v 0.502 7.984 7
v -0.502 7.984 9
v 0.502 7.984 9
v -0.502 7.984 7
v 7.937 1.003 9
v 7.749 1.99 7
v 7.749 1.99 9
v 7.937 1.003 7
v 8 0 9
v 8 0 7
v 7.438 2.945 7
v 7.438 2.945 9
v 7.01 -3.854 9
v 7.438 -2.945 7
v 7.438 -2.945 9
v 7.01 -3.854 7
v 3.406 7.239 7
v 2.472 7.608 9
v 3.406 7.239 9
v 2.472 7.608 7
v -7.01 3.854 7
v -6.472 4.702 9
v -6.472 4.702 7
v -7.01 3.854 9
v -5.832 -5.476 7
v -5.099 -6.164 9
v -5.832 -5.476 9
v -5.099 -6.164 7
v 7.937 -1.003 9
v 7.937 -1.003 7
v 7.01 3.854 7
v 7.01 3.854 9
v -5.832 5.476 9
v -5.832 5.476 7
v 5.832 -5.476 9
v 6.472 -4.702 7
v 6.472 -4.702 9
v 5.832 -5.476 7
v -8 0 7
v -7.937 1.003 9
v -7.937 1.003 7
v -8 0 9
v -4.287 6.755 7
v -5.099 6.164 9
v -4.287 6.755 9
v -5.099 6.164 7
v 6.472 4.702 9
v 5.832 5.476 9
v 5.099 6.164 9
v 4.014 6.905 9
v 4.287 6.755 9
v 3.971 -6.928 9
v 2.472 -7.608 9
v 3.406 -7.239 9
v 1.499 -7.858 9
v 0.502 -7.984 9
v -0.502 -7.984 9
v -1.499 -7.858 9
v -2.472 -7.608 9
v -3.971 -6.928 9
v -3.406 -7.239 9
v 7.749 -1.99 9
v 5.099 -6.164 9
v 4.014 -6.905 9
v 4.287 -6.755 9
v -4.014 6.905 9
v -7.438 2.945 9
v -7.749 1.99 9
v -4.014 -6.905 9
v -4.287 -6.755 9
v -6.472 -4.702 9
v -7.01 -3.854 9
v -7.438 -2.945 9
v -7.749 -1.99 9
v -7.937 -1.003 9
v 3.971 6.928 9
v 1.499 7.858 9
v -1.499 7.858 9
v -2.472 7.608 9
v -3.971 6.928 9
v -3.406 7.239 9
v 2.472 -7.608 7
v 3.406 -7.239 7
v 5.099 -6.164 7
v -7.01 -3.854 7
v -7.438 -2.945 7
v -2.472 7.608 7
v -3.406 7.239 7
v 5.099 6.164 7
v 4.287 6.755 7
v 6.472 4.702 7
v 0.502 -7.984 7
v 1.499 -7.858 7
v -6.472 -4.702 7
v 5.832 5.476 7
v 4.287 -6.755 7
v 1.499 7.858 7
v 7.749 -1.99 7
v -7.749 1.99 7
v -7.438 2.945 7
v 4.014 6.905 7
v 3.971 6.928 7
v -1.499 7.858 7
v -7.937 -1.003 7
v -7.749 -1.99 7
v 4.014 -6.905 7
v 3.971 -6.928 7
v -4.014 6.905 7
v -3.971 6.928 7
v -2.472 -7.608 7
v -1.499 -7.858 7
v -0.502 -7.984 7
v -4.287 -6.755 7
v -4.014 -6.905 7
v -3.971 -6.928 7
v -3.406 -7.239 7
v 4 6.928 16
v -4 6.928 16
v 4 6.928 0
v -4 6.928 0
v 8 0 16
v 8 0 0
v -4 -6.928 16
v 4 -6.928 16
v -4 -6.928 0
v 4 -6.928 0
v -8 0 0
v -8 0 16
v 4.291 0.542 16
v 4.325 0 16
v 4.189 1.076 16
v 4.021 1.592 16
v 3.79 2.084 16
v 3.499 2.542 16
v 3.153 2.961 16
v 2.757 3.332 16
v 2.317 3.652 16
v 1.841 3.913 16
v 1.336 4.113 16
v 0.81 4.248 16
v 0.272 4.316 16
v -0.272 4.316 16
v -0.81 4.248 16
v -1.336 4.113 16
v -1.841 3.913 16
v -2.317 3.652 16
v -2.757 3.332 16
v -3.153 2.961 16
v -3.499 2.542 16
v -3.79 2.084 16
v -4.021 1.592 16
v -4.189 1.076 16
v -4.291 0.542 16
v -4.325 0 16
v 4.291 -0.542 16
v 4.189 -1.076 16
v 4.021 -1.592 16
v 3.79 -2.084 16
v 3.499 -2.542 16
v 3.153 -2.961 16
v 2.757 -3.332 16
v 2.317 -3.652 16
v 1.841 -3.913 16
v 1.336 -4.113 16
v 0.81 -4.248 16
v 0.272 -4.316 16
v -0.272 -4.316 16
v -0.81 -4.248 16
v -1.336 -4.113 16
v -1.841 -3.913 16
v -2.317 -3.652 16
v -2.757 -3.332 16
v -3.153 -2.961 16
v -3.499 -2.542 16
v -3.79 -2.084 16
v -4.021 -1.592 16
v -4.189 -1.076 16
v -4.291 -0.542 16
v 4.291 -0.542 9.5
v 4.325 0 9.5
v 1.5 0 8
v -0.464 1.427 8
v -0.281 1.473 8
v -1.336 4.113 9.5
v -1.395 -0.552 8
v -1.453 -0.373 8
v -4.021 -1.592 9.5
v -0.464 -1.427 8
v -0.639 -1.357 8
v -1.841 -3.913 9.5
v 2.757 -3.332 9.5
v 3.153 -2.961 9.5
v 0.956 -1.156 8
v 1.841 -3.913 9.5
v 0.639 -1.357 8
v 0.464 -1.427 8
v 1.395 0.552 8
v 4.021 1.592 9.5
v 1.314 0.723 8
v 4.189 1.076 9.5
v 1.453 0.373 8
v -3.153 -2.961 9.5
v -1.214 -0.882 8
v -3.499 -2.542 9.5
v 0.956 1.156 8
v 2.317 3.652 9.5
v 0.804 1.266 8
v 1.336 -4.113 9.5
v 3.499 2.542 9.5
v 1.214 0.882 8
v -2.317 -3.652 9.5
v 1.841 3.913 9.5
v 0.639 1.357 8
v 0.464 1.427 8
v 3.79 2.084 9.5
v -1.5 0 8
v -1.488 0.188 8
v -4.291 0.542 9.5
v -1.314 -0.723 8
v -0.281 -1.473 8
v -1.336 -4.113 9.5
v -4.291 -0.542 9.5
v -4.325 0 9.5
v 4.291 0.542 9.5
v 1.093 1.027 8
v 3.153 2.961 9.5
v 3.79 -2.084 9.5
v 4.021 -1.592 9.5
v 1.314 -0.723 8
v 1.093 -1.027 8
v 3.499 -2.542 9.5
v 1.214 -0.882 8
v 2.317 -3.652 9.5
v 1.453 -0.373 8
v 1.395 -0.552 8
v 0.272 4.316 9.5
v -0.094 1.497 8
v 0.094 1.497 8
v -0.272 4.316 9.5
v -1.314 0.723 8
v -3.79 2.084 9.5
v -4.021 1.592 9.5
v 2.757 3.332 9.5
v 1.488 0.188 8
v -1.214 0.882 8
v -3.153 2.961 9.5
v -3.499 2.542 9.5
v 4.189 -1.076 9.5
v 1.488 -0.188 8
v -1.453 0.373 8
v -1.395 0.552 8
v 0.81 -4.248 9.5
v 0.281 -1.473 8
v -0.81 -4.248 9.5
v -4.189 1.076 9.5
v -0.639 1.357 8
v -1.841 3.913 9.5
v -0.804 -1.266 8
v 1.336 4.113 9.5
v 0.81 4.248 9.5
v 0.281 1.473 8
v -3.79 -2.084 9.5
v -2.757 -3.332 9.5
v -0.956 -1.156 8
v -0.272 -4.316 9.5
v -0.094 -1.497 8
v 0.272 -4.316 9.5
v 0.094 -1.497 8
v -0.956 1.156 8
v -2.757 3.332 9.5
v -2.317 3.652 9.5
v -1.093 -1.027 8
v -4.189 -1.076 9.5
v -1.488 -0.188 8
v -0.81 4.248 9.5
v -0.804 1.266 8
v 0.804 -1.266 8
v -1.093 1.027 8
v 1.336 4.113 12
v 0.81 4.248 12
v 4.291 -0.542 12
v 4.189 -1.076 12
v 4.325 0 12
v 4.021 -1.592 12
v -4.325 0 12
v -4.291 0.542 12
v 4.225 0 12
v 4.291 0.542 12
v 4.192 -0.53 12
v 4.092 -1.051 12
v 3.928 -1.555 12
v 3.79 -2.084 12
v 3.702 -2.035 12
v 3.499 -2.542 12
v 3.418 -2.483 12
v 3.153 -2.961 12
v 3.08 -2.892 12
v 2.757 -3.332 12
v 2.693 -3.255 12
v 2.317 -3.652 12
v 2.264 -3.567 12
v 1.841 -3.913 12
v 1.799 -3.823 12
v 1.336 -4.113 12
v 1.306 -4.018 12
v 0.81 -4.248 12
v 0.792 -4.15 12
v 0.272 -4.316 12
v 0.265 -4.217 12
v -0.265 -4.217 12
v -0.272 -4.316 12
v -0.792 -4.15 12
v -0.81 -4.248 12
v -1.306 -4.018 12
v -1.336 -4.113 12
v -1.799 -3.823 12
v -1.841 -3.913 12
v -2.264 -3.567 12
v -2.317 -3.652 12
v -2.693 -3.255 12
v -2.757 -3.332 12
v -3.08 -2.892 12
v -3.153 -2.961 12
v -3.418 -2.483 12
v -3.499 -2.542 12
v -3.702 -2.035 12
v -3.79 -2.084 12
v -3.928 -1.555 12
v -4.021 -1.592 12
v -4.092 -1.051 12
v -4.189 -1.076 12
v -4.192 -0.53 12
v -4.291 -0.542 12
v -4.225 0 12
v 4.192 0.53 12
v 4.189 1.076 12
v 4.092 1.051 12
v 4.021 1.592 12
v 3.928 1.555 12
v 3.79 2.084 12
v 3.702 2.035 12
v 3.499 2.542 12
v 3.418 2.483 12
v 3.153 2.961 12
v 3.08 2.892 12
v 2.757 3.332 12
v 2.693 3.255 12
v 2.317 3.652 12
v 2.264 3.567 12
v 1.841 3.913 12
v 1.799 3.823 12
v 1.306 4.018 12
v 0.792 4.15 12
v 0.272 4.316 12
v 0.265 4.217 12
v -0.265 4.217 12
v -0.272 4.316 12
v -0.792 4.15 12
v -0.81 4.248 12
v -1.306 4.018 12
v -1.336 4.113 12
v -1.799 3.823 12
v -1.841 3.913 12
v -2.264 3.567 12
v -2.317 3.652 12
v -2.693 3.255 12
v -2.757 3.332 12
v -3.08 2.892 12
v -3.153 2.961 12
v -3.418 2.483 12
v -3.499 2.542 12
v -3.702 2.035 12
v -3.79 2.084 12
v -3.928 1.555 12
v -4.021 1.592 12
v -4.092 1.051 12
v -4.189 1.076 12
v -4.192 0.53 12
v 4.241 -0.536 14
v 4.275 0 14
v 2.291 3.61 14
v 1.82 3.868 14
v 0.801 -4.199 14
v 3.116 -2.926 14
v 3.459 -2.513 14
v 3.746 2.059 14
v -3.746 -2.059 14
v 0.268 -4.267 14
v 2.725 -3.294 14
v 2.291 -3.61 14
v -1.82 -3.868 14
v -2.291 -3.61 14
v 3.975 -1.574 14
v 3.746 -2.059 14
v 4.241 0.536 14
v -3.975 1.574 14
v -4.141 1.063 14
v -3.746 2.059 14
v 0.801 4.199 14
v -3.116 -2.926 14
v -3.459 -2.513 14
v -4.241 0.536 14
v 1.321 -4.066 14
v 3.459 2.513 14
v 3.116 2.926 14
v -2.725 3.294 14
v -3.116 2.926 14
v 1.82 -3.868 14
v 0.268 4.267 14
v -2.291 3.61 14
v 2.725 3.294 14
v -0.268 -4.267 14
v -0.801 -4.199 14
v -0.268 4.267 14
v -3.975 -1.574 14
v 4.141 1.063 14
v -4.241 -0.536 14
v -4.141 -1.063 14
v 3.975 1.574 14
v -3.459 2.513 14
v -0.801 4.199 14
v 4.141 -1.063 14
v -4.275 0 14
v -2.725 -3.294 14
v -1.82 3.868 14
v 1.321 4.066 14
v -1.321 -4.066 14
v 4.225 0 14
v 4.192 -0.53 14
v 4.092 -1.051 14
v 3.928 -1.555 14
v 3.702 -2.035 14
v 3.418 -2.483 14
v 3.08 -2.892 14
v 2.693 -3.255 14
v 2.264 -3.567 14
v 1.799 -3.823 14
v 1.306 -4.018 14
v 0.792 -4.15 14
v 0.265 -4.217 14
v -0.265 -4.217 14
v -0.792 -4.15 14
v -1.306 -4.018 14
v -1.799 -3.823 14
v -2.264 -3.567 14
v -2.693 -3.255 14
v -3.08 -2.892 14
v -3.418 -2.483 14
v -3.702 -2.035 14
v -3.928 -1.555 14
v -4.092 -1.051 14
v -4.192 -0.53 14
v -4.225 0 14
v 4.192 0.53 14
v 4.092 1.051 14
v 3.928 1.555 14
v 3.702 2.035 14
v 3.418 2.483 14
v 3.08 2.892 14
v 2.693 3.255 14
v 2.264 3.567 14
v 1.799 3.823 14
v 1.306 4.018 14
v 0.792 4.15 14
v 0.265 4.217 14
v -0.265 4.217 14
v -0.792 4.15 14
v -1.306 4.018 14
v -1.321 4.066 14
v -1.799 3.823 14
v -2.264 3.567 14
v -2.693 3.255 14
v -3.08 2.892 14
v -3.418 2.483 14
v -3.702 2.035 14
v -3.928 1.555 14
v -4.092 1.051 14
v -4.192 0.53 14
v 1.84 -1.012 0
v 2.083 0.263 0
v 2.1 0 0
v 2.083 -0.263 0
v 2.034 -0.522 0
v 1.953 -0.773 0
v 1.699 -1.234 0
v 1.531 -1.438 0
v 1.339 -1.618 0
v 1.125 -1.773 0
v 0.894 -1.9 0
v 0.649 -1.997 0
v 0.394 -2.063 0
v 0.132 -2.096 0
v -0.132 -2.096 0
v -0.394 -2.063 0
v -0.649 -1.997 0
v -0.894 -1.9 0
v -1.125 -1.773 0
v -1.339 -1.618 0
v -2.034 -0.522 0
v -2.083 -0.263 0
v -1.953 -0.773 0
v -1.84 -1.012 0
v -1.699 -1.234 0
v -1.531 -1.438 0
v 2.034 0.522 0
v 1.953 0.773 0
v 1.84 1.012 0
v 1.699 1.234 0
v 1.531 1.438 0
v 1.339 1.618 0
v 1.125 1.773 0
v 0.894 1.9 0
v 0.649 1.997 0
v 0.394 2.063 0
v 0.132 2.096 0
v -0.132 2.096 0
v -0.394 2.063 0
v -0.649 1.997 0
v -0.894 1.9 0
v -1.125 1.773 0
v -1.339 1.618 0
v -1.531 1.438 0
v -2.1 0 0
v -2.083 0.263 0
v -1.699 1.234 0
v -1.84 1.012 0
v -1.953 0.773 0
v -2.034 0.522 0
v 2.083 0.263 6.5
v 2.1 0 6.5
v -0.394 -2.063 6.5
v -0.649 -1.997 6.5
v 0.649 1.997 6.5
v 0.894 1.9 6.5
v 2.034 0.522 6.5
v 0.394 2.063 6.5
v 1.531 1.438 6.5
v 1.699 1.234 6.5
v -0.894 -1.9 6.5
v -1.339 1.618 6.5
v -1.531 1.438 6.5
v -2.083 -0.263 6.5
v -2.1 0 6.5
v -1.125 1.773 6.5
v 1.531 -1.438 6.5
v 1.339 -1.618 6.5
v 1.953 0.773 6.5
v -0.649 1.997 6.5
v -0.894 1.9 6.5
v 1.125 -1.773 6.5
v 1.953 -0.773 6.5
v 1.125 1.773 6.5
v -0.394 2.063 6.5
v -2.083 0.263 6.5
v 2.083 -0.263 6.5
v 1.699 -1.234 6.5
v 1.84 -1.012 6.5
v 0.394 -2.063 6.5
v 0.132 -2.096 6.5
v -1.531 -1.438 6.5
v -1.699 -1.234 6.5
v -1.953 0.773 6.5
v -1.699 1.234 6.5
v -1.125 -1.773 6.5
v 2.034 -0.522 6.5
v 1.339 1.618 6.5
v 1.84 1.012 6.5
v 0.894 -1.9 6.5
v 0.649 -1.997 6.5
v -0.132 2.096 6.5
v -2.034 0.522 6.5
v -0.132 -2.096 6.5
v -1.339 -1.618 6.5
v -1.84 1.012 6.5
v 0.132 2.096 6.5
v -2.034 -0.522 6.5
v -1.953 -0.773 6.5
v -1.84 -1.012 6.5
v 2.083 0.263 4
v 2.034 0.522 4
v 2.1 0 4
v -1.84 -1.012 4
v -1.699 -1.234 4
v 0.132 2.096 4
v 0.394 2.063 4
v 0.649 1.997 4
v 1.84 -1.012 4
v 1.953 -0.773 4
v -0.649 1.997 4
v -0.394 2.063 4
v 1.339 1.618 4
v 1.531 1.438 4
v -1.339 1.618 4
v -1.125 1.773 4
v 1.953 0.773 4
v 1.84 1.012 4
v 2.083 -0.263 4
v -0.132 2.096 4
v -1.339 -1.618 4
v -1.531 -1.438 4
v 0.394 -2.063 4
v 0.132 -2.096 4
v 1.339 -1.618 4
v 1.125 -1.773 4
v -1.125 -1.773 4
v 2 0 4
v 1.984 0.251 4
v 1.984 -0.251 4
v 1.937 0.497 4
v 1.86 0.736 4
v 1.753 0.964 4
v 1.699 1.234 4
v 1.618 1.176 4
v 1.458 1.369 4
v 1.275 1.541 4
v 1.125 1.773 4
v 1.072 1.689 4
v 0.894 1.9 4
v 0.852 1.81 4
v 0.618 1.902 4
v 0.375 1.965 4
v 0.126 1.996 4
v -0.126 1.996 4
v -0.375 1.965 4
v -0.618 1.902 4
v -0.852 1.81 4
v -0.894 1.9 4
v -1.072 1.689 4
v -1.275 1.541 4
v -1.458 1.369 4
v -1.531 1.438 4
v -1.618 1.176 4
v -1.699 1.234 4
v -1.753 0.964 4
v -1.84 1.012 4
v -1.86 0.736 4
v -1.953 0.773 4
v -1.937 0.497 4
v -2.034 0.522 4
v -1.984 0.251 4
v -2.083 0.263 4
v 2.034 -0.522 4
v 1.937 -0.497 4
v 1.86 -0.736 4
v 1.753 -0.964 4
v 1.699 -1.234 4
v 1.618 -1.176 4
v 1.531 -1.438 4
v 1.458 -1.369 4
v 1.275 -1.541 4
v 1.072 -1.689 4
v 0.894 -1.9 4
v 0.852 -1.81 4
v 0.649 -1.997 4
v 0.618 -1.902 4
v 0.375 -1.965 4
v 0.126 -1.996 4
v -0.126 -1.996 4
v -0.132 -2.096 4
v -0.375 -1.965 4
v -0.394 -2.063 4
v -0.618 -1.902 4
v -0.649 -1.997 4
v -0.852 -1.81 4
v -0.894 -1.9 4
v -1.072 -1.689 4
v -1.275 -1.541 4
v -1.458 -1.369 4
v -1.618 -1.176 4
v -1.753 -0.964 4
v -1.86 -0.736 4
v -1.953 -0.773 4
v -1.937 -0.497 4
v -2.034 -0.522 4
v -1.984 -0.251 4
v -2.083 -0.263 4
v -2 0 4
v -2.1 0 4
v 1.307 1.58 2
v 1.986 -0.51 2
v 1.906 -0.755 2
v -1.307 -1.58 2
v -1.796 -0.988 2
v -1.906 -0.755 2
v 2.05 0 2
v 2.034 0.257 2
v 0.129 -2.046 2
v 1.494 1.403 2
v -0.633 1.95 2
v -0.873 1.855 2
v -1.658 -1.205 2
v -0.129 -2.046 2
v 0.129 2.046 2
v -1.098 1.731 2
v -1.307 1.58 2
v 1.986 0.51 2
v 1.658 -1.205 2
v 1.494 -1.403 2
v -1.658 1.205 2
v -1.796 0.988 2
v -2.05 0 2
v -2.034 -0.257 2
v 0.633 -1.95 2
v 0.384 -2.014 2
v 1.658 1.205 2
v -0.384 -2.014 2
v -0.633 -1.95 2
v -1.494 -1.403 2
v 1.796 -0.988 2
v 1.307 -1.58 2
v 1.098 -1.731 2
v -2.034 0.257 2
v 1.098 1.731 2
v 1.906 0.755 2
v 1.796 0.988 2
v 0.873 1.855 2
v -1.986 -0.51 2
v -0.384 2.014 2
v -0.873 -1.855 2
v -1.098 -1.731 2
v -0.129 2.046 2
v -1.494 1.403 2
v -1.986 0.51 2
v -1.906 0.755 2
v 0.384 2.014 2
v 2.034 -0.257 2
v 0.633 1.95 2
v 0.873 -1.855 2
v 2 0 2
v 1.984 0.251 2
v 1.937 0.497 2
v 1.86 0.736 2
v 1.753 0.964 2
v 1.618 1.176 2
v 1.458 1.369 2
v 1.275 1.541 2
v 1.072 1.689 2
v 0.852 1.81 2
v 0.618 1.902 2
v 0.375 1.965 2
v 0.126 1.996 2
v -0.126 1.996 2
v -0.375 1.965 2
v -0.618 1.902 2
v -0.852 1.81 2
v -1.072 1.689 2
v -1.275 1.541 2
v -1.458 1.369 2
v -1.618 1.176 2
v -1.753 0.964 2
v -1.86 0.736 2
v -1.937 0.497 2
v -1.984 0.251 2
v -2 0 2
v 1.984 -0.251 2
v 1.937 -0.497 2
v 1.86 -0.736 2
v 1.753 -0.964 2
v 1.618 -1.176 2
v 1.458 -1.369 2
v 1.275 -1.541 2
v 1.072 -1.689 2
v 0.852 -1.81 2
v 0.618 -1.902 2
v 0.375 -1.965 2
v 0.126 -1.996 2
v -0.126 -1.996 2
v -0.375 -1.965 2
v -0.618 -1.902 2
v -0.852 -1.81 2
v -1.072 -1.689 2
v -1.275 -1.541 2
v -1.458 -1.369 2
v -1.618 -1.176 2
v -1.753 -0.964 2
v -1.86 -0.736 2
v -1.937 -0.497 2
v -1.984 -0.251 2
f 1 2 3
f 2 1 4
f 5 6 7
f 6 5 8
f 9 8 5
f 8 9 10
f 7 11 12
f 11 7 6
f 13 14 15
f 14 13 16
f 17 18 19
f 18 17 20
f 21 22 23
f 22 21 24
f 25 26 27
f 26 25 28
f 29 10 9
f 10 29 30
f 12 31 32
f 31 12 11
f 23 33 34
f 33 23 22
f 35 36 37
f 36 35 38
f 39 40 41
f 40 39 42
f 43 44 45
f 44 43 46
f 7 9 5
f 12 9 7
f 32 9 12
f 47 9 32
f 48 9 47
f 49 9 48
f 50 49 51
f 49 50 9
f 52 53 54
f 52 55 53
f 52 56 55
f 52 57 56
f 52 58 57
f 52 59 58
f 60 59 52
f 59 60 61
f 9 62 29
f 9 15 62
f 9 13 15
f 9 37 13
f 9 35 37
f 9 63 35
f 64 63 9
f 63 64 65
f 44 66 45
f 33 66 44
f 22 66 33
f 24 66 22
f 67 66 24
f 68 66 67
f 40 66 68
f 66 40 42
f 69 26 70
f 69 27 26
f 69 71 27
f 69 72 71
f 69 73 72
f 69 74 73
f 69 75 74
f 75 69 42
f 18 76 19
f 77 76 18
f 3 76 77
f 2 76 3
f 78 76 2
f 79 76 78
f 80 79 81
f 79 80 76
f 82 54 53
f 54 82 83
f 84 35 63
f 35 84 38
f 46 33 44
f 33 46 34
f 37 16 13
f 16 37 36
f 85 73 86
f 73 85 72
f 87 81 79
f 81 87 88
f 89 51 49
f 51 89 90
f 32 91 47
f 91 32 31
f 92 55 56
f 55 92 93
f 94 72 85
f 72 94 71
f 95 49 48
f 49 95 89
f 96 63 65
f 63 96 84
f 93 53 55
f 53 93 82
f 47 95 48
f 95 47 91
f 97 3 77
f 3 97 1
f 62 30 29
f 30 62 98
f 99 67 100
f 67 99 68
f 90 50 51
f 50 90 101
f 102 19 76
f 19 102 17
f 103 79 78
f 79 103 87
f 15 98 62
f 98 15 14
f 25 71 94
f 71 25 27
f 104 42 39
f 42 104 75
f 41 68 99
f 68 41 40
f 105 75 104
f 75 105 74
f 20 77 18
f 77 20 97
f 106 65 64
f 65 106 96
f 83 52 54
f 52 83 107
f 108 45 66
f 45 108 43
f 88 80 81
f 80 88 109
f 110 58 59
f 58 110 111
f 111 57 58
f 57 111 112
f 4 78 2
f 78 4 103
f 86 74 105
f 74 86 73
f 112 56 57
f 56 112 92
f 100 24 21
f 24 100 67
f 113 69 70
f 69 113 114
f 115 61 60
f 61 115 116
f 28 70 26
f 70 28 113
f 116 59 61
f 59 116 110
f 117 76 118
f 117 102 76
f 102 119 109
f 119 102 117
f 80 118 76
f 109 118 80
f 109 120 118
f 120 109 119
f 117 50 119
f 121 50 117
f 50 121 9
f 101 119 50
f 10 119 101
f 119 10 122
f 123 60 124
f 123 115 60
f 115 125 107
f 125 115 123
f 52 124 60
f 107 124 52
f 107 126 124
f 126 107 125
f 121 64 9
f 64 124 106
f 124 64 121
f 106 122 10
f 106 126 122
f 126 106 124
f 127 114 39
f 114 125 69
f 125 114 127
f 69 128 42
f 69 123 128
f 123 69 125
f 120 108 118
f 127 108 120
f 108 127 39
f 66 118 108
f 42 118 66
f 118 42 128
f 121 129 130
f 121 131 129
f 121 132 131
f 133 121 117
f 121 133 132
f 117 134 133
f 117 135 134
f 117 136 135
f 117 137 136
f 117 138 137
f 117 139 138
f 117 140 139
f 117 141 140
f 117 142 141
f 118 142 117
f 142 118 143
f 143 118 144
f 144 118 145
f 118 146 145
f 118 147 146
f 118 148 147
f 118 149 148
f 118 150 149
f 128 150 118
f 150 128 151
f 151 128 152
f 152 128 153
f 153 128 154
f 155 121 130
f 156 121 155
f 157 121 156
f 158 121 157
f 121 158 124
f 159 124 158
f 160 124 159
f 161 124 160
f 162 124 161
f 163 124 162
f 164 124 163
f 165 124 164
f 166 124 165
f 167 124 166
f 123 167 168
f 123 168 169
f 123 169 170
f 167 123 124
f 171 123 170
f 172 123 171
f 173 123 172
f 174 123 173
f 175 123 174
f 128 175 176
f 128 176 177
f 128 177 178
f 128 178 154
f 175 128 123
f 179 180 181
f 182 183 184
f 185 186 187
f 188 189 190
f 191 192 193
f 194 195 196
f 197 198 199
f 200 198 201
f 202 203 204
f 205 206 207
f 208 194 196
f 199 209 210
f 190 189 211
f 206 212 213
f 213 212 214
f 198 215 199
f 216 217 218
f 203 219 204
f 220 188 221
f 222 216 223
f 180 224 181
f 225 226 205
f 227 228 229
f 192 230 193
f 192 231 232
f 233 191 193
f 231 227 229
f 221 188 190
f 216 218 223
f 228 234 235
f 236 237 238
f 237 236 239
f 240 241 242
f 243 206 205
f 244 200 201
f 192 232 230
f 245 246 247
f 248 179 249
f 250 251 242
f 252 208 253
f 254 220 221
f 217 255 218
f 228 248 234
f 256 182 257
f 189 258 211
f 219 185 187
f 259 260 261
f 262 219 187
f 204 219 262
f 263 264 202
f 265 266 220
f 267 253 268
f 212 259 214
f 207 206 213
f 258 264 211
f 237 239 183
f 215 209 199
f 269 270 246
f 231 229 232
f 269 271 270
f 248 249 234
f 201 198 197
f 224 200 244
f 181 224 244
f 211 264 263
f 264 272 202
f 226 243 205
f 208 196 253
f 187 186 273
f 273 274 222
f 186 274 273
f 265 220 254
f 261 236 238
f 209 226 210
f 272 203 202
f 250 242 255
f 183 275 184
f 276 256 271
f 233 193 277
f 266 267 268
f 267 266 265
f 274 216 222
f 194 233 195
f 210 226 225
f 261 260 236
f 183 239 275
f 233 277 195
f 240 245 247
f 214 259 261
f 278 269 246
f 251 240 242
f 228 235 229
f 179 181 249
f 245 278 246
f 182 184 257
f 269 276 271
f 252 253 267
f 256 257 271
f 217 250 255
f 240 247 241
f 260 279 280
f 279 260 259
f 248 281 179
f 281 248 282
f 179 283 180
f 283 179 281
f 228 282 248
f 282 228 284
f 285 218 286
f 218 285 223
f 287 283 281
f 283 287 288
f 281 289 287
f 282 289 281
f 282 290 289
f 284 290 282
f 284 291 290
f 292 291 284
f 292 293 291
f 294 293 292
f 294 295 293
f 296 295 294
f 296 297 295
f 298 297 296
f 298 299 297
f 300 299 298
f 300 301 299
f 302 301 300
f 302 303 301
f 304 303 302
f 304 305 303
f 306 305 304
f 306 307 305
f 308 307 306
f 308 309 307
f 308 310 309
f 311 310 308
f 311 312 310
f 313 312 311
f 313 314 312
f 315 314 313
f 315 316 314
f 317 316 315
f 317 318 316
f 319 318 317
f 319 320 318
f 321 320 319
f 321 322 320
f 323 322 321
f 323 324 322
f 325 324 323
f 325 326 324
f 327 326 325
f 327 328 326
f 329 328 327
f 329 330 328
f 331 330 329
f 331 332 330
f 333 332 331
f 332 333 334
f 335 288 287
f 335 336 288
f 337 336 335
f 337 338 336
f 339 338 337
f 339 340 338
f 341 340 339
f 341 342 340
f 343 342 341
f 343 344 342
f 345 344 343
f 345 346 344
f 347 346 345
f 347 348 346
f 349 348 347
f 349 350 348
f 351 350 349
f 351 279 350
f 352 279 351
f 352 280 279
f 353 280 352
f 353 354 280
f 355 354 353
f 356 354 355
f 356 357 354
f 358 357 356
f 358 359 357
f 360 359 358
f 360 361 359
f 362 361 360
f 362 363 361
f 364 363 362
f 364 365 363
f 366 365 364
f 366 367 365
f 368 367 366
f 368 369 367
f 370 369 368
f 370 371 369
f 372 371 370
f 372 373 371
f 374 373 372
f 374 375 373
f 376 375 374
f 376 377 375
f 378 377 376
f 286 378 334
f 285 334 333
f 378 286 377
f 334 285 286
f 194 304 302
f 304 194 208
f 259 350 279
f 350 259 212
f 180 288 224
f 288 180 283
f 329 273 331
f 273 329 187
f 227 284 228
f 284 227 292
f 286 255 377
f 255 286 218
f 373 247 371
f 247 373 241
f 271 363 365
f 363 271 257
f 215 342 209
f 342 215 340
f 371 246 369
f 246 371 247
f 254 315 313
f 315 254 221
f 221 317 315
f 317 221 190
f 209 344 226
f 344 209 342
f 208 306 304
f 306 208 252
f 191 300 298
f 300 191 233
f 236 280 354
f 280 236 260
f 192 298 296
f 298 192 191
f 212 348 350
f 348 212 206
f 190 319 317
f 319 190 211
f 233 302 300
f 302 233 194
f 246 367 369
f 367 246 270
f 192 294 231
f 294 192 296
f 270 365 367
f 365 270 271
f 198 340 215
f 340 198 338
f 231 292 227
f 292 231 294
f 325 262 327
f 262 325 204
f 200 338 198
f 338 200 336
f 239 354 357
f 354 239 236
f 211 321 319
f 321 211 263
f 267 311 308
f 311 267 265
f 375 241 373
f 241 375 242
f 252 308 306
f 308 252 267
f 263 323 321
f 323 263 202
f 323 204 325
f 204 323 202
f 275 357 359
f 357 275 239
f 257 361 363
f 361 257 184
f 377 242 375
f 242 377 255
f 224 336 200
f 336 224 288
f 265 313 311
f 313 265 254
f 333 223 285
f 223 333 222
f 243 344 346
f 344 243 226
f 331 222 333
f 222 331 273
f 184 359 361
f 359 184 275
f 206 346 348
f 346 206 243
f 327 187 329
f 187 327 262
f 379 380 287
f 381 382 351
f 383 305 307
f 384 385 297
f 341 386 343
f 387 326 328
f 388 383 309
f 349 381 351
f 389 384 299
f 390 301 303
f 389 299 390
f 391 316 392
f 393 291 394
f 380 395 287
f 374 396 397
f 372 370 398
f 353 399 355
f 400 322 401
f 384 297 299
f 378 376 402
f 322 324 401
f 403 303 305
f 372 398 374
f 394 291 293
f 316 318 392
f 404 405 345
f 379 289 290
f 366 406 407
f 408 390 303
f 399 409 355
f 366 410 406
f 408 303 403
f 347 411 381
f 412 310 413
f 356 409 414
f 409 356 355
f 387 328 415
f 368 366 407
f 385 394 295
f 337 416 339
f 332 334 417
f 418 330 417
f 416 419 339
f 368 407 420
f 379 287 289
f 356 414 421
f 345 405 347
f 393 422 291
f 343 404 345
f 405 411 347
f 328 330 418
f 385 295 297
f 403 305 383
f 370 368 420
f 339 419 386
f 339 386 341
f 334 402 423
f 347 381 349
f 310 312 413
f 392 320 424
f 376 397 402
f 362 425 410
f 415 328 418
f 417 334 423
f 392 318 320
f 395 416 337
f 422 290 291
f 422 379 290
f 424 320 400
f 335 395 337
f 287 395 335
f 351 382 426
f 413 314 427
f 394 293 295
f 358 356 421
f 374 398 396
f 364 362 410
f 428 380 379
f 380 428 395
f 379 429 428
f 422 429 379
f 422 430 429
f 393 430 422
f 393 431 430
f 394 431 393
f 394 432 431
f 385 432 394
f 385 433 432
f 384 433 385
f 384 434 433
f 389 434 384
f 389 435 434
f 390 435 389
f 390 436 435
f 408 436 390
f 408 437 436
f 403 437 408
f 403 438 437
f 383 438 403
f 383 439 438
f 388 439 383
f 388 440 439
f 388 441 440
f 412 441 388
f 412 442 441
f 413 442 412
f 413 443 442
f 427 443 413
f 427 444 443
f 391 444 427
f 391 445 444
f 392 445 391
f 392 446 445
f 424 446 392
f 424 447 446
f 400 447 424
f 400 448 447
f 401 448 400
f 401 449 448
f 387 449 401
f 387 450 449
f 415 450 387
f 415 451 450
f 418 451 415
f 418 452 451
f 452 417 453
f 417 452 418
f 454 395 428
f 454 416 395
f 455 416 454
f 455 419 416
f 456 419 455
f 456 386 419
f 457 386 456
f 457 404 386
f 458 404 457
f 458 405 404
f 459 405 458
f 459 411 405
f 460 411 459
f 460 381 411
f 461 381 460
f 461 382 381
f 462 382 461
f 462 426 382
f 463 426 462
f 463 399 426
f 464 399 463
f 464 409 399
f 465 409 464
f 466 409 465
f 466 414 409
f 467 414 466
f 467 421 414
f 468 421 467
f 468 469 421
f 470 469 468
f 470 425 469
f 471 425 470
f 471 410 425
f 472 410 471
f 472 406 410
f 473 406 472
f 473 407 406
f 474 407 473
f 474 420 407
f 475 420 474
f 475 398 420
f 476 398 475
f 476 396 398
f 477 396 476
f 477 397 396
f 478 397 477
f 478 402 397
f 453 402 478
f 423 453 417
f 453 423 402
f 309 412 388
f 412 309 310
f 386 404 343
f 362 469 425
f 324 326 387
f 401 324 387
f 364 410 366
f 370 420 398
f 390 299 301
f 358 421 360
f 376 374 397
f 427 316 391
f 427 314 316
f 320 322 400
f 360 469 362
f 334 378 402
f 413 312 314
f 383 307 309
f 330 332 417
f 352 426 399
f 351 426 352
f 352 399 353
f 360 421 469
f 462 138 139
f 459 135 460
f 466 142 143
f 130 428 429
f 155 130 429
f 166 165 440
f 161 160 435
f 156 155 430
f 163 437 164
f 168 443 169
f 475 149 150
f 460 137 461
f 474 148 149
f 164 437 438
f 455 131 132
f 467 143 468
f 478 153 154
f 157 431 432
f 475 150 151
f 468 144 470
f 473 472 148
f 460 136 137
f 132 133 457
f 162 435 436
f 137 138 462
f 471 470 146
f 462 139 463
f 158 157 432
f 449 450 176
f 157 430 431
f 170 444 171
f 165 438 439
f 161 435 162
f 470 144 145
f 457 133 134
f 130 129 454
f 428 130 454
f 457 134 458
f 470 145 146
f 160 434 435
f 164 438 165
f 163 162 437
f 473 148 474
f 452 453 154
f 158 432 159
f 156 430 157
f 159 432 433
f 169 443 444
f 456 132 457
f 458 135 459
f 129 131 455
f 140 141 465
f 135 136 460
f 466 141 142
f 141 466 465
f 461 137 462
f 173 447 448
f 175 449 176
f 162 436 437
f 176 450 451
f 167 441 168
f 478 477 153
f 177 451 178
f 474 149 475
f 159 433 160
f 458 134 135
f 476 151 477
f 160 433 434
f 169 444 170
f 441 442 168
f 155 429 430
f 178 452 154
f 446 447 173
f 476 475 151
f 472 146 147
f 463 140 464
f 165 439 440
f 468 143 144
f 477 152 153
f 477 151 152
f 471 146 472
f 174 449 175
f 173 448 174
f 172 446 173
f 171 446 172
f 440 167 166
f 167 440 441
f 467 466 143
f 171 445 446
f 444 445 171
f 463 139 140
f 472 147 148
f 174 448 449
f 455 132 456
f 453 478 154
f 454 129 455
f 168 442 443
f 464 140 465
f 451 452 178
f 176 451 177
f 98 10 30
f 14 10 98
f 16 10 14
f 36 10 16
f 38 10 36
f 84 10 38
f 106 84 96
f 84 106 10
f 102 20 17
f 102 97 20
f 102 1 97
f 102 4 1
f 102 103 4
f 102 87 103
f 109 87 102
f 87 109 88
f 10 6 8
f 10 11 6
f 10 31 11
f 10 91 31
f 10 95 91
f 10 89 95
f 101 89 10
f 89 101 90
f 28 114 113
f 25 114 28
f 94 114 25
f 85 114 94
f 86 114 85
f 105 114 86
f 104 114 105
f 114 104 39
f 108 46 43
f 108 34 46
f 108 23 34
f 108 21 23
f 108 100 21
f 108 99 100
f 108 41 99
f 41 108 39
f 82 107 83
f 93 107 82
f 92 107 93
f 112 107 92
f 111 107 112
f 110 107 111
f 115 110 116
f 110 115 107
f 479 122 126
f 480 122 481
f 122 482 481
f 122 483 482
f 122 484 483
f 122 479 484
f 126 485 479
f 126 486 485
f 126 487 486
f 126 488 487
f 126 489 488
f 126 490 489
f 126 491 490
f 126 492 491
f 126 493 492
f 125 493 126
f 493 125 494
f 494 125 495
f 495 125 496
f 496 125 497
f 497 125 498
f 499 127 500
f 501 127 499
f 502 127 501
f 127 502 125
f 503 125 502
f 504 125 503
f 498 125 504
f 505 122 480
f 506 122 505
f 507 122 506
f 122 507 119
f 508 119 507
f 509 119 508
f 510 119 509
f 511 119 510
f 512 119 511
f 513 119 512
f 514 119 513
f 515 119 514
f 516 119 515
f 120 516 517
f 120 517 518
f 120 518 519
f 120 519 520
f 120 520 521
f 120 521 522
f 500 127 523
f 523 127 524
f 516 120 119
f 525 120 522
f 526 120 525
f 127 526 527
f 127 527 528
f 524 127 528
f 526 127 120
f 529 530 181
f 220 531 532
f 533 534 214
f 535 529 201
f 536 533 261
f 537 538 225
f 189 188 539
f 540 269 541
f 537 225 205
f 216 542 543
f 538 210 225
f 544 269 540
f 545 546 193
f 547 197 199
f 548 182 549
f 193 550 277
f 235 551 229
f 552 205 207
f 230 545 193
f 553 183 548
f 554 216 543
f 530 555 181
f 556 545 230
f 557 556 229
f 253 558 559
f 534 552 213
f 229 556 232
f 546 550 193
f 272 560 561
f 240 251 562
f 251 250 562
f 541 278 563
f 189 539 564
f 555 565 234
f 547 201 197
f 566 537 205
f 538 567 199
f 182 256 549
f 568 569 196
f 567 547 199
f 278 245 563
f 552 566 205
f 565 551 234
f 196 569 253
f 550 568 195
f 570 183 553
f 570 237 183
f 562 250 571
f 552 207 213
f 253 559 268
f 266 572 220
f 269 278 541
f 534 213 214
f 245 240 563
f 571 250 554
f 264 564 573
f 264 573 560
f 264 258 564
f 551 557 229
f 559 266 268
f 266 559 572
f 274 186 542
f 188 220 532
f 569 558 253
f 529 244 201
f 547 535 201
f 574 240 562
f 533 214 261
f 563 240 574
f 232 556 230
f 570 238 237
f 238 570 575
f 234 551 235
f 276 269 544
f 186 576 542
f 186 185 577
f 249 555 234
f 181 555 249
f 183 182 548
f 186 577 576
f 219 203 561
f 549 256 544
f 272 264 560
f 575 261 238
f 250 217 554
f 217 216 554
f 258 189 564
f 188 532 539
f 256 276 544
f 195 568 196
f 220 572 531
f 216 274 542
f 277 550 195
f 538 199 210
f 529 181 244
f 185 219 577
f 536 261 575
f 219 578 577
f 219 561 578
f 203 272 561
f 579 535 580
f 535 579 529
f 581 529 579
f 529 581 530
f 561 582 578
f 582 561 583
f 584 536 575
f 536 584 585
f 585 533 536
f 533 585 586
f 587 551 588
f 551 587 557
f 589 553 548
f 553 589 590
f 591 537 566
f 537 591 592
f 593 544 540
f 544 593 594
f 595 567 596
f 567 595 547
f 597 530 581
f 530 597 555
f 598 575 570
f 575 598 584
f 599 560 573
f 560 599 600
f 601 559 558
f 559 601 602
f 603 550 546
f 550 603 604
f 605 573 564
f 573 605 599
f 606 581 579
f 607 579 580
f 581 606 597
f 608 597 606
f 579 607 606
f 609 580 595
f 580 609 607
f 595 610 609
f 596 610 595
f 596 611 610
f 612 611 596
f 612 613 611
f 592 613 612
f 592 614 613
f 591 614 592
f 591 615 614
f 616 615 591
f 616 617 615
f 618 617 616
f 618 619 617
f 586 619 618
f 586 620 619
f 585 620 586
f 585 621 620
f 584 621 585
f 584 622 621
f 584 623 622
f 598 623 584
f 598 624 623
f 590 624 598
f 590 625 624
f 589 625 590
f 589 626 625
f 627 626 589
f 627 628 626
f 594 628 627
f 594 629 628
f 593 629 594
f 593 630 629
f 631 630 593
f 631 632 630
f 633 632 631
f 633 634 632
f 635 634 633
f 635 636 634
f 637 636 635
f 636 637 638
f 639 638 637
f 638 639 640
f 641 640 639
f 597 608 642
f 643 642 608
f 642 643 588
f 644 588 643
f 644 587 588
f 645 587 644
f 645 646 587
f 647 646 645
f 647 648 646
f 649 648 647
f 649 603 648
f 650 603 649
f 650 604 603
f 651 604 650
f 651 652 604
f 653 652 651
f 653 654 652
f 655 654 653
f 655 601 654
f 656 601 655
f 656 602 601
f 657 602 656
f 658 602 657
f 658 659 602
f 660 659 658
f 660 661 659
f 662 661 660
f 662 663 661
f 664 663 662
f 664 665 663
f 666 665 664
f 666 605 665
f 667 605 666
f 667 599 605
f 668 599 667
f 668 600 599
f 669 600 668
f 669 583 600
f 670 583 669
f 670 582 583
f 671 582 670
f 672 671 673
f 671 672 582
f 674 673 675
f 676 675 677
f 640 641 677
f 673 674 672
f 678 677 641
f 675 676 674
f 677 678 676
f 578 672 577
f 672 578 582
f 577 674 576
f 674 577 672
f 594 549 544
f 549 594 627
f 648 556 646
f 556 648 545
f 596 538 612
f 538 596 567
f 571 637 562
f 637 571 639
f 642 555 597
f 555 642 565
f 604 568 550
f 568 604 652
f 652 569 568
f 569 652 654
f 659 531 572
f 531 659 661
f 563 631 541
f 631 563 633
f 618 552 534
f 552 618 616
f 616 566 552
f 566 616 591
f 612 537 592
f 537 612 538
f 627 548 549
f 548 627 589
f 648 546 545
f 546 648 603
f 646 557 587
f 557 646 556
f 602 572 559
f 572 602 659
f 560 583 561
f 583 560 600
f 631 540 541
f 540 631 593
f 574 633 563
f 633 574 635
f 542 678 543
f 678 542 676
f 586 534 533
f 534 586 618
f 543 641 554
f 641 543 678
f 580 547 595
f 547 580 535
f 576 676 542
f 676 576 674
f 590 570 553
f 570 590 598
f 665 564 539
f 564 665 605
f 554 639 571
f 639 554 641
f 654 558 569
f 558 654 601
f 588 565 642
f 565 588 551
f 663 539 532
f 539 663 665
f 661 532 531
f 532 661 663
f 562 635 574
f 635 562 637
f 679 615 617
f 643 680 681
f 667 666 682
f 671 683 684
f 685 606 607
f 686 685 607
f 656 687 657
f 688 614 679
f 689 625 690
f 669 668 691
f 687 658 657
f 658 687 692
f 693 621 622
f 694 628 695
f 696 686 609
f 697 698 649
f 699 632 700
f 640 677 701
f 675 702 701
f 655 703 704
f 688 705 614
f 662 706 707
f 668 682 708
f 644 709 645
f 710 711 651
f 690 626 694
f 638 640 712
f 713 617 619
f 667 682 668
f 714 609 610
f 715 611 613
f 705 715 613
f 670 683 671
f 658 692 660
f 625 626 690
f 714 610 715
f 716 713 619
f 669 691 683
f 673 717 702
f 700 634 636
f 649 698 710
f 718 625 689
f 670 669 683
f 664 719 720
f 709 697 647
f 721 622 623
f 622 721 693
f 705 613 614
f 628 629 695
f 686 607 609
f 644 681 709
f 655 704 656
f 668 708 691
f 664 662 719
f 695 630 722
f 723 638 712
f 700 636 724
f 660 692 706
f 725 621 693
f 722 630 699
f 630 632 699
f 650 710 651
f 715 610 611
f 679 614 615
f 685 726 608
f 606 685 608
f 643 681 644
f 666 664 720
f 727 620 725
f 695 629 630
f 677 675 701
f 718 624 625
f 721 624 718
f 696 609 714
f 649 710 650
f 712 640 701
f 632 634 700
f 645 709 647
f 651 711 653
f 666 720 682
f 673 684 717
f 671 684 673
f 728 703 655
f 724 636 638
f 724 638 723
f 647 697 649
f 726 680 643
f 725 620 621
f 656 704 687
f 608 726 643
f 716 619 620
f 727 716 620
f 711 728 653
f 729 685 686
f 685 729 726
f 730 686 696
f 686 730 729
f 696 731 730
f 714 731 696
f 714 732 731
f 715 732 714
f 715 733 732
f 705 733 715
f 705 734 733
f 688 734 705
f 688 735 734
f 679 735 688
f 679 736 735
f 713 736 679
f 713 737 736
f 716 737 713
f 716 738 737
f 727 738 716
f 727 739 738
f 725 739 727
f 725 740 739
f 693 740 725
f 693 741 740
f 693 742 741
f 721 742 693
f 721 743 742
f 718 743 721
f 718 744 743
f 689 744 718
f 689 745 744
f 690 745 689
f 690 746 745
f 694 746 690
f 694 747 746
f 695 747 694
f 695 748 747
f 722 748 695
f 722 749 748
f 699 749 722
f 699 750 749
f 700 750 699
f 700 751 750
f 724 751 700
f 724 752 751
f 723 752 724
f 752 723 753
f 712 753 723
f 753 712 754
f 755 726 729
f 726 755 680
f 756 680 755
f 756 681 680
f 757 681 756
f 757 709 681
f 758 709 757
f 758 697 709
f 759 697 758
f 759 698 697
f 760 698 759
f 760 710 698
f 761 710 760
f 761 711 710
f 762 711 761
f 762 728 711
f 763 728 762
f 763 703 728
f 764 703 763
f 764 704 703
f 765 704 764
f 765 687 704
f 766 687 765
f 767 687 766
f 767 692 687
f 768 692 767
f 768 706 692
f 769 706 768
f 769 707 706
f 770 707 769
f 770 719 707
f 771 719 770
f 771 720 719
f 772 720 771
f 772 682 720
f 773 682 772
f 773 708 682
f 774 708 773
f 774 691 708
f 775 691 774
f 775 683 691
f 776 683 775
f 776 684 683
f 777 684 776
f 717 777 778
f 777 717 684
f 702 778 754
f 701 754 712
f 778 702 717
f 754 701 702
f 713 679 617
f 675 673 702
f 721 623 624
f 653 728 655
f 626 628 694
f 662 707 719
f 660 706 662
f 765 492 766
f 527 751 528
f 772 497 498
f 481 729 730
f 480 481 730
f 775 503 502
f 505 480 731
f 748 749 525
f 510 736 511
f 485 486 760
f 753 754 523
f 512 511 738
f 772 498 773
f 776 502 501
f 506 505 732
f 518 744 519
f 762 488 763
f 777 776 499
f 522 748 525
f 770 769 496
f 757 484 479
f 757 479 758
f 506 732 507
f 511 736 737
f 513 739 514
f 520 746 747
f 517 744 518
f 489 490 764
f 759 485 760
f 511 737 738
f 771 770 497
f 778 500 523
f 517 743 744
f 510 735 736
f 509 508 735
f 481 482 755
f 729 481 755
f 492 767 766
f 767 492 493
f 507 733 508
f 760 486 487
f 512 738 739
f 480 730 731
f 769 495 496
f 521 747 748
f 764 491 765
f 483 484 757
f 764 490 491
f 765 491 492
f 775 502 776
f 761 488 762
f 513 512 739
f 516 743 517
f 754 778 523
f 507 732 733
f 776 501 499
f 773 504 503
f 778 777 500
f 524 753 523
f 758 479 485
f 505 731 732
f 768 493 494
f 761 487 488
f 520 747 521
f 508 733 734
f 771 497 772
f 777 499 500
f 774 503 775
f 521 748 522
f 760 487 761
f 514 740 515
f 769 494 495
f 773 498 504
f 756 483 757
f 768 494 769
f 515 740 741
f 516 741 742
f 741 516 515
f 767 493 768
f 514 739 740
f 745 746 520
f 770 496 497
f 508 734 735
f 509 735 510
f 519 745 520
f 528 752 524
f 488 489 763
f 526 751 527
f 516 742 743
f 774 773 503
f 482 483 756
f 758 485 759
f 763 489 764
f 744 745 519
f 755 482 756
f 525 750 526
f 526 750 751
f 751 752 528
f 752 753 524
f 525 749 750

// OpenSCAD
// file: adapter.scad
module adapter_grommet(filament_r=1.5) {

     grommet_id = 6;
     grommet_thick = 3.6;

     pin_length = grommet_thick;

     pin_or = grommet_id / 2;
     pin_ir = pin_or - 1.5;
     bump_or = pin_or + 0.3;

     $fn = 50;

     difference() {
	  // outer shape of pin, with bump on rim
	  union() {
	       cylinder(pin_length + 1, r=3);
	       translate([0, 0, pin_length]) {
		    cylinder(1, r=bump_or);
	       };
	  }

	  // slots for relief
	  translate([0, 0, 4]) {
	       cube([10, 0.5, 6], center=true);

	       rotate([0, 0, 90]) {
		    cube([10, 0.5, 6], center=true);
	       };
	  };

	  cylinder(pin_length + 1, r=filament_r);
	  translate([0, 0, pin_length - 1]) {
	       cylinder(2, filament_r, pin_or - 0.5);
	  };
     };
}


module adapter_tube(tubing_od=4.1, pinch=0.1, filament_r=1.5) {

     hole_r = tubing_od / 2;
     squeeze_r = hole_r - (pinch / 2);
     spacious_r = hole_r + (pinch / 2);

     $fn = 50;

     difference() {
	  // I like the look of a hex nut for the body of the adapter
	  cylinder(8, r=8, $fn=6);

	  // upper ceiling contracts to the grommet adapter size
	  translate([0, 0, 6.5]) {
	       cylinder(1.5, spacious_r, filament_r);
	  };

	  // main space
	  translate([0, 0, 4]) {
	       cylinder(2.5, r=spacious_r);
	  };

	  // inner flange
	  translate([0, 0, 2]) {
	       cylinder(2, hole_r, squeeze_r);
	  };

	  // bottom flange
	  cylinder(2, spacious_r, squeeze_r);
     };

     // a little ring that fits over the protrusion of the grommet
     translate([0, 0, 8]) {
	  difference() {
	       cylinder(1, r=8);
	       translate([0, 0, -1]) {
		    cylinder(3, r=5.6);
	       };
	  };
     };
}


module adapter(tubing_od=4.1) {
     union() {
	  translate([0, 0, 8]) {
	       adapter_grommet();
	  };
	  adapter_tube(tubing_od);
     };
}


adapter();


// The end.
// main file
use <adapter.scad>;


module adapter_extruder(tubing_od, extruder_od) {
     union() {
	  translate([0, 0, 16]) {
	       rotate([180, 0, 0]) {
		    adapter_tube(extruder_od);
	       };
	  };
	  adapter_tube(tubing_od);
     }
}


adapter_extruder(4.1, 8.55);


// The end.
